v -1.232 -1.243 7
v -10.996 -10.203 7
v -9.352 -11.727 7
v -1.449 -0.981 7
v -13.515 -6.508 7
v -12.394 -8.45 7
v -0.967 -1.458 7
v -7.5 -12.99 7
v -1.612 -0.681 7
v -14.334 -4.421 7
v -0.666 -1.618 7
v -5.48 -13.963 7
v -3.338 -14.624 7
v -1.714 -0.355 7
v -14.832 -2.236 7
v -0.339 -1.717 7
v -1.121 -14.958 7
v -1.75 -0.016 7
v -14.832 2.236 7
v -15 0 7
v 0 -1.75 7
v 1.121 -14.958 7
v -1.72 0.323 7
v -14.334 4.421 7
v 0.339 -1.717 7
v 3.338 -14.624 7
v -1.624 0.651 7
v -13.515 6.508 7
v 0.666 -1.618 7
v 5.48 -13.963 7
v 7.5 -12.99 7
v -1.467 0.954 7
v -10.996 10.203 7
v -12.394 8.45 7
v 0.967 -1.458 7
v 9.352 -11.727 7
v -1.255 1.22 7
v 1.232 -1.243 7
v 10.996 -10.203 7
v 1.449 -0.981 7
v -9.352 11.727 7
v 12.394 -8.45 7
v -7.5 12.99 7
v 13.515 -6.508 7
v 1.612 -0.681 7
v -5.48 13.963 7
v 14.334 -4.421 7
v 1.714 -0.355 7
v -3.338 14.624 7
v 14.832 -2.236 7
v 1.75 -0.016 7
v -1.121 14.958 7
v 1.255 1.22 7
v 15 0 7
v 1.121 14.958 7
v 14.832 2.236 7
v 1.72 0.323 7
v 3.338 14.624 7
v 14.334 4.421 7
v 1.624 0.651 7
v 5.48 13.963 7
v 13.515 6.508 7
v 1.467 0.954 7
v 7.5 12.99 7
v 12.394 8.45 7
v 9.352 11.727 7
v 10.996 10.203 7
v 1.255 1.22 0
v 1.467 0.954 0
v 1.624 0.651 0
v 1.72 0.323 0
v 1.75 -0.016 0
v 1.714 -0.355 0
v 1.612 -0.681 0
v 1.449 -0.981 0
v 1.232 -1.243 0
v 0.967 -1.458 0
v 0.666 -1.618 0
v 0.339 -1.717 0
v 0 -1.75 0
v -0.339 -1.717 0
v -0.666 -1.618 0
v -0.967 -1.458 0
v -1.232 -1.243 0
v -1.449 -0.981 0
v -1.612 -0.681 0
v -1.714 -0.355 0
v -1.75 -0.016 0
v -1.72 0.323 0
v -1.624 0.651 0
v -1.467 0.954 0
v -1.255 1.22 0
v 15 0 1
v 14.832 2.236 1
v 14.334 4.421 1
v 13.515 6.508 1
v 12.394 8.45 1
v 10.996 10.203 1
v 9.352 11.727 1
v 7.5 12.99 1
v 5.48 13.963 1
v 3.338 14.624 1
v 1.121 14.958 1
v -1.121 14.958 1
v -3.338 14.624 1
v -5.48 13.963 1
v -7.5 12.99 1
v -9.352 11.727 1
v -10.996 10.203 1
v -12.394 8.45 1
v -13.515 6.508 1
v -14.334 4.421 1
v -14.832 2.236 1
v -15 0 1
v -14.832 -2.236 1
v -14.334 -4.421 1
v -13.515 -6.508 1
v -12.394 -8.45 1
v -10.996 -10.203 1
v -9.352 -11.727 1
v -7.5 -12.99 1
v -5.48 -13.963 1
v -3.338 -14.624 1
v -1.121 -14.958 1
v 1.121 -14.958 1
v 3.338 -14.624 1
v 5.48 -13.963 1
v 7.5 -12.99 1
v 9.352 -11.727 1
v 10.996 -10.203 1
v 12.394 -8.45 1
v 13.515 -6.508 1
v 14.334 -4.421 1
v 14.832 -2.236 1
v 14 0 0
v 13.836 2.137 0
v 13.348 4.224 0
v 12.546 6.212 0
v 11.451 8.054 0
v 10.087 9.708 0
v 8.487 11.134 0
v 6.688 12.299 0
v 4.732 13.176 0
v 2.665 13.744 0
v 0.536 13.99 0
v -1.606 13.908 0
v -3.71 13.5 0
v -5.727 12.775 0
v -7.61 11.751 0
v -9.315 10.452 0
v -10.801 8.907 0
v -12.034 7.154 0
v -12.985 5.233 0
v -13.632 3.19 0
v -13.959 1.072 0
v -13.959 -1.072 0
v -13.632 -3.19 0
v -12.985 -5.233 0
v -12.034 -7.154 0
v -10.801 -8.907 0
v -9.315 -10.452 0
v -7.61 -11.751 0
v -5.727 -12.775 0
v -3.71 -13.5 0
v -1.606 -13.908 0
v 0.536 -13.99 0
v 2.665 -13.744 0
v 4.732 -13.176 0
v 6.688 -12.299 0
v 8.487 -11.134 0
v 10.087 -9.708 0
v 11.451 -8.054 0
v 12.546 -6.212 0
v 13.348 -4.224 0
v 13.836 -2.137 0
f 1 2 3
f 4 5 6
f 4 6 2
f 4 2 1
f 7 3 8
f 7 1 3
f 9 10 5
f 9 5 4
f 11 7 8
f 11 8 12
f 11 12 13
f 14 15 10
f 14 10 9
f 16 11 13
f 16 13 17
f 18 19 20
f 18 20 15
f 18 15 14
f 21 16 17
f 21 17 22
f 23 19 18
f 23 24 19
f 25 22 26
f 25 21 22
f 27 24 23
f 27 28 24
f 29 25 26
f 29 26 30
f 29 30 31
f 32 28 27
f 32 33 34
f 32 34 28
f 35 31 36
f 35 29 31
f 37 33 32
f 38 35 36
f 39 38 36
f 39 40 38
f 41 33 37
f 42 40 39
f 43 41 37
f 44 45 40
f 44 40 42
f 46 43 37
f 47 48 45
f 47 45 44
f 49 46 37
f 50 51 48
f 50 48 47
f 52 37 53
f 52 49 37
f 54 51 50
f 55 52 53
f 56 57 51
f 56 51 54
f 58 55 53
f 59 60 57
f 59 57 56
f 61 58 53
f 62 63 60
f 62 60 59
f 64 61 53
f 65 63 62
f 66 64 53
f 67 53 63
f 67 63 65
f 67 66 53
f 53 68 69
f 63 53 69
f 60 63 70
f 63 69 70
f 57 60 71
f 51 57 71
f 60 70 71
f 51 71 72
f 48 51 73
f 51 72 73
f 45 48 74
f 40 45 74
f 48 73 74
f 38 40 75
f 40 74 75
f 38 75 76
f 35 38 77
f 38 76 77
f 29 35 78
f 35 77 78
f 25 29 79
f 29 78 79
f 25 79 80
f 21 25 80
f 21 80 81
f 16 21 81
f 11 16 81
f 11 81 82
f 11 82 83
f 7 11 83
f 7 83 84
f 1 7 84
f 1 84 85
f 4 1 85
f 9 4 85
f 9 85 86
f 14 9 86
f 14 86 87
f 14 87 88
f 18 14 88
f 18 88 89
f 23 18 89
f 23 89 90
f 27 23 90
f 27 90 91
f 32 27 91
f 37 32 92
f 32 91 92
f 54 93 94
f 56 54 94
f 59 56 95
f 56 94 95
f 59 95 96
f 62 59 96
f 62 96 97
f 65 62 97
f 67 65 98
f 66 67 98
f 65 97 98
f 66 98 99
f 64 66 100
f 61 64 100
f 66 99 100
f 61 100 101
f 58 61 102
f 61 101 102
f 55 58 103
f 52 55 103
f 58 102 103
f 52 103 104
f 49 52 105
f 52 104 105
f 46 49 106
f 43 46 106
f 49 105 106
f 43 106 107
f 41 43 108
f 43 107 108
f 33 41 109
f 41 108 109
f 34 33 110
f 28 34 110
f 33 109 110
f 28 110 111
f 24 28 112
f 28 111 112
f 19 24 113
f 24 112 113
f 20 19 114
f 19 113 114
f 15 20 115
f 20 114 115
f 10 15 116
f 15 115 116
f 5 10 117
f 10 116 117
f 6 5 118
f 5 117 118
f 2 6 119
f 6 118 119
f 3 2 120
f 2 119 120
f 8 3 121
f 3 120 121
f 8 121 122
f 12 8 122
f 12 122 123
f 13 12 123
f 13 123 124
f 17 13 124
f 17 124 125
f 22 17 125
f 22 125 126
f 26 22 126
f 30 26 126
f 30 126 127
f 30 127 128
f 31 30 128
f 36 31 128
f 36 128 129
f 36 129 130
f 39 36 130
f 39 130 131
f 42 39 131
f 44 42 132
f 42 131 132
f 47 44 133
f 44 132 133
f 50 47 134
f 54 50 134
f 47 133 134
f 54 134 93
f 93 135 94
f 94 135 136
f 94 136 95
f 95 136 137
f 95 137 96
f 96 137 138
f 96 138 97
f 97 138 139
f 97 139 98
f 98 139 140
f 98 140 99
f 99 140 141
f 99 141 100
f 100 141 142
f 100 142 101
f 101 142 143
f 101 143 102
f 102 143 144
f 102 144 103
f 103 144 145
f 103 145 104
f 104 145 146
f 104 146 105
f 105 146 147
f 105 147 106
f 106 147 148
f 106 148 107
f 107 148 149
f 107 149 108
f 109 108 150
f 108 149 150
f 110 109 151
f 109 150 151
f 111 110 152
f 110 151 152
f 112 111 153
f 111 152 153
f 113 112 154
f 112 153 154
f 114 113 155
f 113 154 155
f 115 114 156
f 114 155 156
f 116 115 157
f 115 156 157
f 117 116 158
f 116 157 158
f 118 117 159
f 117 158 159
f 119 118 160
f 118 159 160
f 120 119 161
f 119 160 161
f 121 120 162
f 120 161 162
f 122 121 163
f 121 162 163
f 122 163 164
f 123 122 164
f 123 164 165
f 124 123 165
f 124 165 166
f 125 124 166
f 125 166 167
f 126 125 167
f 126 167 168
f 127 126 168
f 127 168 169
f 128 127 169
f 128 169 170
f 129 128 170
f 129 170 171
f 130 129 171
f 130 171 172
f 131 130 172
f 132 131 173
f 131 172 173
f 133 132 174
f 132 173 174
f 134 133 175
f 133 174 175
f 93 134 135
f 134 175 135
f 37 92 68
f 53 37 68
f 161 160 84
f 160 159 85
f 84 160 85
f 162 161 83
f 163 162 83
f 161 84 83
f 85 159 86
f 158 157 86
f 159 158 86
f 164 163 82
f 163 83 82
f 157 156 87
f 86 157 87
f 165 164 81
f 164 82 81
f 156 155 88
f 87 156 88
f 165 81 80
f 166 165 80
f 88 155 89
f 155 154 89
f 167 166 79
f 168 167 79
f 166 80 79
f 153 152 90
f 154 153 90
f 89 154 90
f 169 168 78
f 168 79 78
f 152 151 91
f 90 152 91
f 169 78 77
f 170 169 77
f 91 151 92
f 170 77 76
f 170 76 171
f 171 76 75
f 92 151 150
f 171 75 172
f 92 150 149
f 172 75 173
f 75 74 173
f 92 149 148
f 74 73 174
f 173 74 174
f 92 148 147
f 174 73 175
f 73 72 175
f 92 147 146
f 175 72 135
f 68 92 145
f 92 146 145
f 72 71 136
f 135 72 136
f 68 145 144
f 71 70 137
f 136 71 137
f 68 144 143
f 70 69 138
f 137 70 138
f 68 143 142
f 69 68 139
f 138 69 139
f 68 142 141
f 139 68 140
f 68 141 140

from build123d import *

# Parameters (mm, degrees)
F0_R     = 15
F1_DEPTH = 7
F2_DEPTH = 5
F3_SIZE  = 1


with BuildPart() as f1:
    # F0 (on Top) → F1 (new body)
    with BuildSketch(Plane.XY):
        Circle(F0_R)
        with BuildLine():
            ThreePointArc((1.254631, 1.22), (0, -1.75), (-1.254631, 1.22))
            Line((-1.254631, 1.22), (1.254631, 1.22))
        make_face(mode=Mode.SUBTRACT)
    extrude(amount=F1_DEPTH)

    # F0 (on Top) → F2 (join)
    with BuildSketch(Plane.XY):
        Circle(F0_R)
        with BuildLine():
            ThreePointArc((1.254631, 1.22), (0, -1.75), (-1.254631, 1.22))
            Line((-1.254631, 1.22), (1.254631, 1.22))
        make_face(mode=Mode.SUBTRACT)
    extrude(amount=F2_DEPTH)

    # F3
    f3_edges = [f1.edges().sort_by_distance(p)[0] for p in [
        (-15, 0, 0),
    ]]
    chamfer(f3_edges, length=F3_SIZE)


solid = f1.part
